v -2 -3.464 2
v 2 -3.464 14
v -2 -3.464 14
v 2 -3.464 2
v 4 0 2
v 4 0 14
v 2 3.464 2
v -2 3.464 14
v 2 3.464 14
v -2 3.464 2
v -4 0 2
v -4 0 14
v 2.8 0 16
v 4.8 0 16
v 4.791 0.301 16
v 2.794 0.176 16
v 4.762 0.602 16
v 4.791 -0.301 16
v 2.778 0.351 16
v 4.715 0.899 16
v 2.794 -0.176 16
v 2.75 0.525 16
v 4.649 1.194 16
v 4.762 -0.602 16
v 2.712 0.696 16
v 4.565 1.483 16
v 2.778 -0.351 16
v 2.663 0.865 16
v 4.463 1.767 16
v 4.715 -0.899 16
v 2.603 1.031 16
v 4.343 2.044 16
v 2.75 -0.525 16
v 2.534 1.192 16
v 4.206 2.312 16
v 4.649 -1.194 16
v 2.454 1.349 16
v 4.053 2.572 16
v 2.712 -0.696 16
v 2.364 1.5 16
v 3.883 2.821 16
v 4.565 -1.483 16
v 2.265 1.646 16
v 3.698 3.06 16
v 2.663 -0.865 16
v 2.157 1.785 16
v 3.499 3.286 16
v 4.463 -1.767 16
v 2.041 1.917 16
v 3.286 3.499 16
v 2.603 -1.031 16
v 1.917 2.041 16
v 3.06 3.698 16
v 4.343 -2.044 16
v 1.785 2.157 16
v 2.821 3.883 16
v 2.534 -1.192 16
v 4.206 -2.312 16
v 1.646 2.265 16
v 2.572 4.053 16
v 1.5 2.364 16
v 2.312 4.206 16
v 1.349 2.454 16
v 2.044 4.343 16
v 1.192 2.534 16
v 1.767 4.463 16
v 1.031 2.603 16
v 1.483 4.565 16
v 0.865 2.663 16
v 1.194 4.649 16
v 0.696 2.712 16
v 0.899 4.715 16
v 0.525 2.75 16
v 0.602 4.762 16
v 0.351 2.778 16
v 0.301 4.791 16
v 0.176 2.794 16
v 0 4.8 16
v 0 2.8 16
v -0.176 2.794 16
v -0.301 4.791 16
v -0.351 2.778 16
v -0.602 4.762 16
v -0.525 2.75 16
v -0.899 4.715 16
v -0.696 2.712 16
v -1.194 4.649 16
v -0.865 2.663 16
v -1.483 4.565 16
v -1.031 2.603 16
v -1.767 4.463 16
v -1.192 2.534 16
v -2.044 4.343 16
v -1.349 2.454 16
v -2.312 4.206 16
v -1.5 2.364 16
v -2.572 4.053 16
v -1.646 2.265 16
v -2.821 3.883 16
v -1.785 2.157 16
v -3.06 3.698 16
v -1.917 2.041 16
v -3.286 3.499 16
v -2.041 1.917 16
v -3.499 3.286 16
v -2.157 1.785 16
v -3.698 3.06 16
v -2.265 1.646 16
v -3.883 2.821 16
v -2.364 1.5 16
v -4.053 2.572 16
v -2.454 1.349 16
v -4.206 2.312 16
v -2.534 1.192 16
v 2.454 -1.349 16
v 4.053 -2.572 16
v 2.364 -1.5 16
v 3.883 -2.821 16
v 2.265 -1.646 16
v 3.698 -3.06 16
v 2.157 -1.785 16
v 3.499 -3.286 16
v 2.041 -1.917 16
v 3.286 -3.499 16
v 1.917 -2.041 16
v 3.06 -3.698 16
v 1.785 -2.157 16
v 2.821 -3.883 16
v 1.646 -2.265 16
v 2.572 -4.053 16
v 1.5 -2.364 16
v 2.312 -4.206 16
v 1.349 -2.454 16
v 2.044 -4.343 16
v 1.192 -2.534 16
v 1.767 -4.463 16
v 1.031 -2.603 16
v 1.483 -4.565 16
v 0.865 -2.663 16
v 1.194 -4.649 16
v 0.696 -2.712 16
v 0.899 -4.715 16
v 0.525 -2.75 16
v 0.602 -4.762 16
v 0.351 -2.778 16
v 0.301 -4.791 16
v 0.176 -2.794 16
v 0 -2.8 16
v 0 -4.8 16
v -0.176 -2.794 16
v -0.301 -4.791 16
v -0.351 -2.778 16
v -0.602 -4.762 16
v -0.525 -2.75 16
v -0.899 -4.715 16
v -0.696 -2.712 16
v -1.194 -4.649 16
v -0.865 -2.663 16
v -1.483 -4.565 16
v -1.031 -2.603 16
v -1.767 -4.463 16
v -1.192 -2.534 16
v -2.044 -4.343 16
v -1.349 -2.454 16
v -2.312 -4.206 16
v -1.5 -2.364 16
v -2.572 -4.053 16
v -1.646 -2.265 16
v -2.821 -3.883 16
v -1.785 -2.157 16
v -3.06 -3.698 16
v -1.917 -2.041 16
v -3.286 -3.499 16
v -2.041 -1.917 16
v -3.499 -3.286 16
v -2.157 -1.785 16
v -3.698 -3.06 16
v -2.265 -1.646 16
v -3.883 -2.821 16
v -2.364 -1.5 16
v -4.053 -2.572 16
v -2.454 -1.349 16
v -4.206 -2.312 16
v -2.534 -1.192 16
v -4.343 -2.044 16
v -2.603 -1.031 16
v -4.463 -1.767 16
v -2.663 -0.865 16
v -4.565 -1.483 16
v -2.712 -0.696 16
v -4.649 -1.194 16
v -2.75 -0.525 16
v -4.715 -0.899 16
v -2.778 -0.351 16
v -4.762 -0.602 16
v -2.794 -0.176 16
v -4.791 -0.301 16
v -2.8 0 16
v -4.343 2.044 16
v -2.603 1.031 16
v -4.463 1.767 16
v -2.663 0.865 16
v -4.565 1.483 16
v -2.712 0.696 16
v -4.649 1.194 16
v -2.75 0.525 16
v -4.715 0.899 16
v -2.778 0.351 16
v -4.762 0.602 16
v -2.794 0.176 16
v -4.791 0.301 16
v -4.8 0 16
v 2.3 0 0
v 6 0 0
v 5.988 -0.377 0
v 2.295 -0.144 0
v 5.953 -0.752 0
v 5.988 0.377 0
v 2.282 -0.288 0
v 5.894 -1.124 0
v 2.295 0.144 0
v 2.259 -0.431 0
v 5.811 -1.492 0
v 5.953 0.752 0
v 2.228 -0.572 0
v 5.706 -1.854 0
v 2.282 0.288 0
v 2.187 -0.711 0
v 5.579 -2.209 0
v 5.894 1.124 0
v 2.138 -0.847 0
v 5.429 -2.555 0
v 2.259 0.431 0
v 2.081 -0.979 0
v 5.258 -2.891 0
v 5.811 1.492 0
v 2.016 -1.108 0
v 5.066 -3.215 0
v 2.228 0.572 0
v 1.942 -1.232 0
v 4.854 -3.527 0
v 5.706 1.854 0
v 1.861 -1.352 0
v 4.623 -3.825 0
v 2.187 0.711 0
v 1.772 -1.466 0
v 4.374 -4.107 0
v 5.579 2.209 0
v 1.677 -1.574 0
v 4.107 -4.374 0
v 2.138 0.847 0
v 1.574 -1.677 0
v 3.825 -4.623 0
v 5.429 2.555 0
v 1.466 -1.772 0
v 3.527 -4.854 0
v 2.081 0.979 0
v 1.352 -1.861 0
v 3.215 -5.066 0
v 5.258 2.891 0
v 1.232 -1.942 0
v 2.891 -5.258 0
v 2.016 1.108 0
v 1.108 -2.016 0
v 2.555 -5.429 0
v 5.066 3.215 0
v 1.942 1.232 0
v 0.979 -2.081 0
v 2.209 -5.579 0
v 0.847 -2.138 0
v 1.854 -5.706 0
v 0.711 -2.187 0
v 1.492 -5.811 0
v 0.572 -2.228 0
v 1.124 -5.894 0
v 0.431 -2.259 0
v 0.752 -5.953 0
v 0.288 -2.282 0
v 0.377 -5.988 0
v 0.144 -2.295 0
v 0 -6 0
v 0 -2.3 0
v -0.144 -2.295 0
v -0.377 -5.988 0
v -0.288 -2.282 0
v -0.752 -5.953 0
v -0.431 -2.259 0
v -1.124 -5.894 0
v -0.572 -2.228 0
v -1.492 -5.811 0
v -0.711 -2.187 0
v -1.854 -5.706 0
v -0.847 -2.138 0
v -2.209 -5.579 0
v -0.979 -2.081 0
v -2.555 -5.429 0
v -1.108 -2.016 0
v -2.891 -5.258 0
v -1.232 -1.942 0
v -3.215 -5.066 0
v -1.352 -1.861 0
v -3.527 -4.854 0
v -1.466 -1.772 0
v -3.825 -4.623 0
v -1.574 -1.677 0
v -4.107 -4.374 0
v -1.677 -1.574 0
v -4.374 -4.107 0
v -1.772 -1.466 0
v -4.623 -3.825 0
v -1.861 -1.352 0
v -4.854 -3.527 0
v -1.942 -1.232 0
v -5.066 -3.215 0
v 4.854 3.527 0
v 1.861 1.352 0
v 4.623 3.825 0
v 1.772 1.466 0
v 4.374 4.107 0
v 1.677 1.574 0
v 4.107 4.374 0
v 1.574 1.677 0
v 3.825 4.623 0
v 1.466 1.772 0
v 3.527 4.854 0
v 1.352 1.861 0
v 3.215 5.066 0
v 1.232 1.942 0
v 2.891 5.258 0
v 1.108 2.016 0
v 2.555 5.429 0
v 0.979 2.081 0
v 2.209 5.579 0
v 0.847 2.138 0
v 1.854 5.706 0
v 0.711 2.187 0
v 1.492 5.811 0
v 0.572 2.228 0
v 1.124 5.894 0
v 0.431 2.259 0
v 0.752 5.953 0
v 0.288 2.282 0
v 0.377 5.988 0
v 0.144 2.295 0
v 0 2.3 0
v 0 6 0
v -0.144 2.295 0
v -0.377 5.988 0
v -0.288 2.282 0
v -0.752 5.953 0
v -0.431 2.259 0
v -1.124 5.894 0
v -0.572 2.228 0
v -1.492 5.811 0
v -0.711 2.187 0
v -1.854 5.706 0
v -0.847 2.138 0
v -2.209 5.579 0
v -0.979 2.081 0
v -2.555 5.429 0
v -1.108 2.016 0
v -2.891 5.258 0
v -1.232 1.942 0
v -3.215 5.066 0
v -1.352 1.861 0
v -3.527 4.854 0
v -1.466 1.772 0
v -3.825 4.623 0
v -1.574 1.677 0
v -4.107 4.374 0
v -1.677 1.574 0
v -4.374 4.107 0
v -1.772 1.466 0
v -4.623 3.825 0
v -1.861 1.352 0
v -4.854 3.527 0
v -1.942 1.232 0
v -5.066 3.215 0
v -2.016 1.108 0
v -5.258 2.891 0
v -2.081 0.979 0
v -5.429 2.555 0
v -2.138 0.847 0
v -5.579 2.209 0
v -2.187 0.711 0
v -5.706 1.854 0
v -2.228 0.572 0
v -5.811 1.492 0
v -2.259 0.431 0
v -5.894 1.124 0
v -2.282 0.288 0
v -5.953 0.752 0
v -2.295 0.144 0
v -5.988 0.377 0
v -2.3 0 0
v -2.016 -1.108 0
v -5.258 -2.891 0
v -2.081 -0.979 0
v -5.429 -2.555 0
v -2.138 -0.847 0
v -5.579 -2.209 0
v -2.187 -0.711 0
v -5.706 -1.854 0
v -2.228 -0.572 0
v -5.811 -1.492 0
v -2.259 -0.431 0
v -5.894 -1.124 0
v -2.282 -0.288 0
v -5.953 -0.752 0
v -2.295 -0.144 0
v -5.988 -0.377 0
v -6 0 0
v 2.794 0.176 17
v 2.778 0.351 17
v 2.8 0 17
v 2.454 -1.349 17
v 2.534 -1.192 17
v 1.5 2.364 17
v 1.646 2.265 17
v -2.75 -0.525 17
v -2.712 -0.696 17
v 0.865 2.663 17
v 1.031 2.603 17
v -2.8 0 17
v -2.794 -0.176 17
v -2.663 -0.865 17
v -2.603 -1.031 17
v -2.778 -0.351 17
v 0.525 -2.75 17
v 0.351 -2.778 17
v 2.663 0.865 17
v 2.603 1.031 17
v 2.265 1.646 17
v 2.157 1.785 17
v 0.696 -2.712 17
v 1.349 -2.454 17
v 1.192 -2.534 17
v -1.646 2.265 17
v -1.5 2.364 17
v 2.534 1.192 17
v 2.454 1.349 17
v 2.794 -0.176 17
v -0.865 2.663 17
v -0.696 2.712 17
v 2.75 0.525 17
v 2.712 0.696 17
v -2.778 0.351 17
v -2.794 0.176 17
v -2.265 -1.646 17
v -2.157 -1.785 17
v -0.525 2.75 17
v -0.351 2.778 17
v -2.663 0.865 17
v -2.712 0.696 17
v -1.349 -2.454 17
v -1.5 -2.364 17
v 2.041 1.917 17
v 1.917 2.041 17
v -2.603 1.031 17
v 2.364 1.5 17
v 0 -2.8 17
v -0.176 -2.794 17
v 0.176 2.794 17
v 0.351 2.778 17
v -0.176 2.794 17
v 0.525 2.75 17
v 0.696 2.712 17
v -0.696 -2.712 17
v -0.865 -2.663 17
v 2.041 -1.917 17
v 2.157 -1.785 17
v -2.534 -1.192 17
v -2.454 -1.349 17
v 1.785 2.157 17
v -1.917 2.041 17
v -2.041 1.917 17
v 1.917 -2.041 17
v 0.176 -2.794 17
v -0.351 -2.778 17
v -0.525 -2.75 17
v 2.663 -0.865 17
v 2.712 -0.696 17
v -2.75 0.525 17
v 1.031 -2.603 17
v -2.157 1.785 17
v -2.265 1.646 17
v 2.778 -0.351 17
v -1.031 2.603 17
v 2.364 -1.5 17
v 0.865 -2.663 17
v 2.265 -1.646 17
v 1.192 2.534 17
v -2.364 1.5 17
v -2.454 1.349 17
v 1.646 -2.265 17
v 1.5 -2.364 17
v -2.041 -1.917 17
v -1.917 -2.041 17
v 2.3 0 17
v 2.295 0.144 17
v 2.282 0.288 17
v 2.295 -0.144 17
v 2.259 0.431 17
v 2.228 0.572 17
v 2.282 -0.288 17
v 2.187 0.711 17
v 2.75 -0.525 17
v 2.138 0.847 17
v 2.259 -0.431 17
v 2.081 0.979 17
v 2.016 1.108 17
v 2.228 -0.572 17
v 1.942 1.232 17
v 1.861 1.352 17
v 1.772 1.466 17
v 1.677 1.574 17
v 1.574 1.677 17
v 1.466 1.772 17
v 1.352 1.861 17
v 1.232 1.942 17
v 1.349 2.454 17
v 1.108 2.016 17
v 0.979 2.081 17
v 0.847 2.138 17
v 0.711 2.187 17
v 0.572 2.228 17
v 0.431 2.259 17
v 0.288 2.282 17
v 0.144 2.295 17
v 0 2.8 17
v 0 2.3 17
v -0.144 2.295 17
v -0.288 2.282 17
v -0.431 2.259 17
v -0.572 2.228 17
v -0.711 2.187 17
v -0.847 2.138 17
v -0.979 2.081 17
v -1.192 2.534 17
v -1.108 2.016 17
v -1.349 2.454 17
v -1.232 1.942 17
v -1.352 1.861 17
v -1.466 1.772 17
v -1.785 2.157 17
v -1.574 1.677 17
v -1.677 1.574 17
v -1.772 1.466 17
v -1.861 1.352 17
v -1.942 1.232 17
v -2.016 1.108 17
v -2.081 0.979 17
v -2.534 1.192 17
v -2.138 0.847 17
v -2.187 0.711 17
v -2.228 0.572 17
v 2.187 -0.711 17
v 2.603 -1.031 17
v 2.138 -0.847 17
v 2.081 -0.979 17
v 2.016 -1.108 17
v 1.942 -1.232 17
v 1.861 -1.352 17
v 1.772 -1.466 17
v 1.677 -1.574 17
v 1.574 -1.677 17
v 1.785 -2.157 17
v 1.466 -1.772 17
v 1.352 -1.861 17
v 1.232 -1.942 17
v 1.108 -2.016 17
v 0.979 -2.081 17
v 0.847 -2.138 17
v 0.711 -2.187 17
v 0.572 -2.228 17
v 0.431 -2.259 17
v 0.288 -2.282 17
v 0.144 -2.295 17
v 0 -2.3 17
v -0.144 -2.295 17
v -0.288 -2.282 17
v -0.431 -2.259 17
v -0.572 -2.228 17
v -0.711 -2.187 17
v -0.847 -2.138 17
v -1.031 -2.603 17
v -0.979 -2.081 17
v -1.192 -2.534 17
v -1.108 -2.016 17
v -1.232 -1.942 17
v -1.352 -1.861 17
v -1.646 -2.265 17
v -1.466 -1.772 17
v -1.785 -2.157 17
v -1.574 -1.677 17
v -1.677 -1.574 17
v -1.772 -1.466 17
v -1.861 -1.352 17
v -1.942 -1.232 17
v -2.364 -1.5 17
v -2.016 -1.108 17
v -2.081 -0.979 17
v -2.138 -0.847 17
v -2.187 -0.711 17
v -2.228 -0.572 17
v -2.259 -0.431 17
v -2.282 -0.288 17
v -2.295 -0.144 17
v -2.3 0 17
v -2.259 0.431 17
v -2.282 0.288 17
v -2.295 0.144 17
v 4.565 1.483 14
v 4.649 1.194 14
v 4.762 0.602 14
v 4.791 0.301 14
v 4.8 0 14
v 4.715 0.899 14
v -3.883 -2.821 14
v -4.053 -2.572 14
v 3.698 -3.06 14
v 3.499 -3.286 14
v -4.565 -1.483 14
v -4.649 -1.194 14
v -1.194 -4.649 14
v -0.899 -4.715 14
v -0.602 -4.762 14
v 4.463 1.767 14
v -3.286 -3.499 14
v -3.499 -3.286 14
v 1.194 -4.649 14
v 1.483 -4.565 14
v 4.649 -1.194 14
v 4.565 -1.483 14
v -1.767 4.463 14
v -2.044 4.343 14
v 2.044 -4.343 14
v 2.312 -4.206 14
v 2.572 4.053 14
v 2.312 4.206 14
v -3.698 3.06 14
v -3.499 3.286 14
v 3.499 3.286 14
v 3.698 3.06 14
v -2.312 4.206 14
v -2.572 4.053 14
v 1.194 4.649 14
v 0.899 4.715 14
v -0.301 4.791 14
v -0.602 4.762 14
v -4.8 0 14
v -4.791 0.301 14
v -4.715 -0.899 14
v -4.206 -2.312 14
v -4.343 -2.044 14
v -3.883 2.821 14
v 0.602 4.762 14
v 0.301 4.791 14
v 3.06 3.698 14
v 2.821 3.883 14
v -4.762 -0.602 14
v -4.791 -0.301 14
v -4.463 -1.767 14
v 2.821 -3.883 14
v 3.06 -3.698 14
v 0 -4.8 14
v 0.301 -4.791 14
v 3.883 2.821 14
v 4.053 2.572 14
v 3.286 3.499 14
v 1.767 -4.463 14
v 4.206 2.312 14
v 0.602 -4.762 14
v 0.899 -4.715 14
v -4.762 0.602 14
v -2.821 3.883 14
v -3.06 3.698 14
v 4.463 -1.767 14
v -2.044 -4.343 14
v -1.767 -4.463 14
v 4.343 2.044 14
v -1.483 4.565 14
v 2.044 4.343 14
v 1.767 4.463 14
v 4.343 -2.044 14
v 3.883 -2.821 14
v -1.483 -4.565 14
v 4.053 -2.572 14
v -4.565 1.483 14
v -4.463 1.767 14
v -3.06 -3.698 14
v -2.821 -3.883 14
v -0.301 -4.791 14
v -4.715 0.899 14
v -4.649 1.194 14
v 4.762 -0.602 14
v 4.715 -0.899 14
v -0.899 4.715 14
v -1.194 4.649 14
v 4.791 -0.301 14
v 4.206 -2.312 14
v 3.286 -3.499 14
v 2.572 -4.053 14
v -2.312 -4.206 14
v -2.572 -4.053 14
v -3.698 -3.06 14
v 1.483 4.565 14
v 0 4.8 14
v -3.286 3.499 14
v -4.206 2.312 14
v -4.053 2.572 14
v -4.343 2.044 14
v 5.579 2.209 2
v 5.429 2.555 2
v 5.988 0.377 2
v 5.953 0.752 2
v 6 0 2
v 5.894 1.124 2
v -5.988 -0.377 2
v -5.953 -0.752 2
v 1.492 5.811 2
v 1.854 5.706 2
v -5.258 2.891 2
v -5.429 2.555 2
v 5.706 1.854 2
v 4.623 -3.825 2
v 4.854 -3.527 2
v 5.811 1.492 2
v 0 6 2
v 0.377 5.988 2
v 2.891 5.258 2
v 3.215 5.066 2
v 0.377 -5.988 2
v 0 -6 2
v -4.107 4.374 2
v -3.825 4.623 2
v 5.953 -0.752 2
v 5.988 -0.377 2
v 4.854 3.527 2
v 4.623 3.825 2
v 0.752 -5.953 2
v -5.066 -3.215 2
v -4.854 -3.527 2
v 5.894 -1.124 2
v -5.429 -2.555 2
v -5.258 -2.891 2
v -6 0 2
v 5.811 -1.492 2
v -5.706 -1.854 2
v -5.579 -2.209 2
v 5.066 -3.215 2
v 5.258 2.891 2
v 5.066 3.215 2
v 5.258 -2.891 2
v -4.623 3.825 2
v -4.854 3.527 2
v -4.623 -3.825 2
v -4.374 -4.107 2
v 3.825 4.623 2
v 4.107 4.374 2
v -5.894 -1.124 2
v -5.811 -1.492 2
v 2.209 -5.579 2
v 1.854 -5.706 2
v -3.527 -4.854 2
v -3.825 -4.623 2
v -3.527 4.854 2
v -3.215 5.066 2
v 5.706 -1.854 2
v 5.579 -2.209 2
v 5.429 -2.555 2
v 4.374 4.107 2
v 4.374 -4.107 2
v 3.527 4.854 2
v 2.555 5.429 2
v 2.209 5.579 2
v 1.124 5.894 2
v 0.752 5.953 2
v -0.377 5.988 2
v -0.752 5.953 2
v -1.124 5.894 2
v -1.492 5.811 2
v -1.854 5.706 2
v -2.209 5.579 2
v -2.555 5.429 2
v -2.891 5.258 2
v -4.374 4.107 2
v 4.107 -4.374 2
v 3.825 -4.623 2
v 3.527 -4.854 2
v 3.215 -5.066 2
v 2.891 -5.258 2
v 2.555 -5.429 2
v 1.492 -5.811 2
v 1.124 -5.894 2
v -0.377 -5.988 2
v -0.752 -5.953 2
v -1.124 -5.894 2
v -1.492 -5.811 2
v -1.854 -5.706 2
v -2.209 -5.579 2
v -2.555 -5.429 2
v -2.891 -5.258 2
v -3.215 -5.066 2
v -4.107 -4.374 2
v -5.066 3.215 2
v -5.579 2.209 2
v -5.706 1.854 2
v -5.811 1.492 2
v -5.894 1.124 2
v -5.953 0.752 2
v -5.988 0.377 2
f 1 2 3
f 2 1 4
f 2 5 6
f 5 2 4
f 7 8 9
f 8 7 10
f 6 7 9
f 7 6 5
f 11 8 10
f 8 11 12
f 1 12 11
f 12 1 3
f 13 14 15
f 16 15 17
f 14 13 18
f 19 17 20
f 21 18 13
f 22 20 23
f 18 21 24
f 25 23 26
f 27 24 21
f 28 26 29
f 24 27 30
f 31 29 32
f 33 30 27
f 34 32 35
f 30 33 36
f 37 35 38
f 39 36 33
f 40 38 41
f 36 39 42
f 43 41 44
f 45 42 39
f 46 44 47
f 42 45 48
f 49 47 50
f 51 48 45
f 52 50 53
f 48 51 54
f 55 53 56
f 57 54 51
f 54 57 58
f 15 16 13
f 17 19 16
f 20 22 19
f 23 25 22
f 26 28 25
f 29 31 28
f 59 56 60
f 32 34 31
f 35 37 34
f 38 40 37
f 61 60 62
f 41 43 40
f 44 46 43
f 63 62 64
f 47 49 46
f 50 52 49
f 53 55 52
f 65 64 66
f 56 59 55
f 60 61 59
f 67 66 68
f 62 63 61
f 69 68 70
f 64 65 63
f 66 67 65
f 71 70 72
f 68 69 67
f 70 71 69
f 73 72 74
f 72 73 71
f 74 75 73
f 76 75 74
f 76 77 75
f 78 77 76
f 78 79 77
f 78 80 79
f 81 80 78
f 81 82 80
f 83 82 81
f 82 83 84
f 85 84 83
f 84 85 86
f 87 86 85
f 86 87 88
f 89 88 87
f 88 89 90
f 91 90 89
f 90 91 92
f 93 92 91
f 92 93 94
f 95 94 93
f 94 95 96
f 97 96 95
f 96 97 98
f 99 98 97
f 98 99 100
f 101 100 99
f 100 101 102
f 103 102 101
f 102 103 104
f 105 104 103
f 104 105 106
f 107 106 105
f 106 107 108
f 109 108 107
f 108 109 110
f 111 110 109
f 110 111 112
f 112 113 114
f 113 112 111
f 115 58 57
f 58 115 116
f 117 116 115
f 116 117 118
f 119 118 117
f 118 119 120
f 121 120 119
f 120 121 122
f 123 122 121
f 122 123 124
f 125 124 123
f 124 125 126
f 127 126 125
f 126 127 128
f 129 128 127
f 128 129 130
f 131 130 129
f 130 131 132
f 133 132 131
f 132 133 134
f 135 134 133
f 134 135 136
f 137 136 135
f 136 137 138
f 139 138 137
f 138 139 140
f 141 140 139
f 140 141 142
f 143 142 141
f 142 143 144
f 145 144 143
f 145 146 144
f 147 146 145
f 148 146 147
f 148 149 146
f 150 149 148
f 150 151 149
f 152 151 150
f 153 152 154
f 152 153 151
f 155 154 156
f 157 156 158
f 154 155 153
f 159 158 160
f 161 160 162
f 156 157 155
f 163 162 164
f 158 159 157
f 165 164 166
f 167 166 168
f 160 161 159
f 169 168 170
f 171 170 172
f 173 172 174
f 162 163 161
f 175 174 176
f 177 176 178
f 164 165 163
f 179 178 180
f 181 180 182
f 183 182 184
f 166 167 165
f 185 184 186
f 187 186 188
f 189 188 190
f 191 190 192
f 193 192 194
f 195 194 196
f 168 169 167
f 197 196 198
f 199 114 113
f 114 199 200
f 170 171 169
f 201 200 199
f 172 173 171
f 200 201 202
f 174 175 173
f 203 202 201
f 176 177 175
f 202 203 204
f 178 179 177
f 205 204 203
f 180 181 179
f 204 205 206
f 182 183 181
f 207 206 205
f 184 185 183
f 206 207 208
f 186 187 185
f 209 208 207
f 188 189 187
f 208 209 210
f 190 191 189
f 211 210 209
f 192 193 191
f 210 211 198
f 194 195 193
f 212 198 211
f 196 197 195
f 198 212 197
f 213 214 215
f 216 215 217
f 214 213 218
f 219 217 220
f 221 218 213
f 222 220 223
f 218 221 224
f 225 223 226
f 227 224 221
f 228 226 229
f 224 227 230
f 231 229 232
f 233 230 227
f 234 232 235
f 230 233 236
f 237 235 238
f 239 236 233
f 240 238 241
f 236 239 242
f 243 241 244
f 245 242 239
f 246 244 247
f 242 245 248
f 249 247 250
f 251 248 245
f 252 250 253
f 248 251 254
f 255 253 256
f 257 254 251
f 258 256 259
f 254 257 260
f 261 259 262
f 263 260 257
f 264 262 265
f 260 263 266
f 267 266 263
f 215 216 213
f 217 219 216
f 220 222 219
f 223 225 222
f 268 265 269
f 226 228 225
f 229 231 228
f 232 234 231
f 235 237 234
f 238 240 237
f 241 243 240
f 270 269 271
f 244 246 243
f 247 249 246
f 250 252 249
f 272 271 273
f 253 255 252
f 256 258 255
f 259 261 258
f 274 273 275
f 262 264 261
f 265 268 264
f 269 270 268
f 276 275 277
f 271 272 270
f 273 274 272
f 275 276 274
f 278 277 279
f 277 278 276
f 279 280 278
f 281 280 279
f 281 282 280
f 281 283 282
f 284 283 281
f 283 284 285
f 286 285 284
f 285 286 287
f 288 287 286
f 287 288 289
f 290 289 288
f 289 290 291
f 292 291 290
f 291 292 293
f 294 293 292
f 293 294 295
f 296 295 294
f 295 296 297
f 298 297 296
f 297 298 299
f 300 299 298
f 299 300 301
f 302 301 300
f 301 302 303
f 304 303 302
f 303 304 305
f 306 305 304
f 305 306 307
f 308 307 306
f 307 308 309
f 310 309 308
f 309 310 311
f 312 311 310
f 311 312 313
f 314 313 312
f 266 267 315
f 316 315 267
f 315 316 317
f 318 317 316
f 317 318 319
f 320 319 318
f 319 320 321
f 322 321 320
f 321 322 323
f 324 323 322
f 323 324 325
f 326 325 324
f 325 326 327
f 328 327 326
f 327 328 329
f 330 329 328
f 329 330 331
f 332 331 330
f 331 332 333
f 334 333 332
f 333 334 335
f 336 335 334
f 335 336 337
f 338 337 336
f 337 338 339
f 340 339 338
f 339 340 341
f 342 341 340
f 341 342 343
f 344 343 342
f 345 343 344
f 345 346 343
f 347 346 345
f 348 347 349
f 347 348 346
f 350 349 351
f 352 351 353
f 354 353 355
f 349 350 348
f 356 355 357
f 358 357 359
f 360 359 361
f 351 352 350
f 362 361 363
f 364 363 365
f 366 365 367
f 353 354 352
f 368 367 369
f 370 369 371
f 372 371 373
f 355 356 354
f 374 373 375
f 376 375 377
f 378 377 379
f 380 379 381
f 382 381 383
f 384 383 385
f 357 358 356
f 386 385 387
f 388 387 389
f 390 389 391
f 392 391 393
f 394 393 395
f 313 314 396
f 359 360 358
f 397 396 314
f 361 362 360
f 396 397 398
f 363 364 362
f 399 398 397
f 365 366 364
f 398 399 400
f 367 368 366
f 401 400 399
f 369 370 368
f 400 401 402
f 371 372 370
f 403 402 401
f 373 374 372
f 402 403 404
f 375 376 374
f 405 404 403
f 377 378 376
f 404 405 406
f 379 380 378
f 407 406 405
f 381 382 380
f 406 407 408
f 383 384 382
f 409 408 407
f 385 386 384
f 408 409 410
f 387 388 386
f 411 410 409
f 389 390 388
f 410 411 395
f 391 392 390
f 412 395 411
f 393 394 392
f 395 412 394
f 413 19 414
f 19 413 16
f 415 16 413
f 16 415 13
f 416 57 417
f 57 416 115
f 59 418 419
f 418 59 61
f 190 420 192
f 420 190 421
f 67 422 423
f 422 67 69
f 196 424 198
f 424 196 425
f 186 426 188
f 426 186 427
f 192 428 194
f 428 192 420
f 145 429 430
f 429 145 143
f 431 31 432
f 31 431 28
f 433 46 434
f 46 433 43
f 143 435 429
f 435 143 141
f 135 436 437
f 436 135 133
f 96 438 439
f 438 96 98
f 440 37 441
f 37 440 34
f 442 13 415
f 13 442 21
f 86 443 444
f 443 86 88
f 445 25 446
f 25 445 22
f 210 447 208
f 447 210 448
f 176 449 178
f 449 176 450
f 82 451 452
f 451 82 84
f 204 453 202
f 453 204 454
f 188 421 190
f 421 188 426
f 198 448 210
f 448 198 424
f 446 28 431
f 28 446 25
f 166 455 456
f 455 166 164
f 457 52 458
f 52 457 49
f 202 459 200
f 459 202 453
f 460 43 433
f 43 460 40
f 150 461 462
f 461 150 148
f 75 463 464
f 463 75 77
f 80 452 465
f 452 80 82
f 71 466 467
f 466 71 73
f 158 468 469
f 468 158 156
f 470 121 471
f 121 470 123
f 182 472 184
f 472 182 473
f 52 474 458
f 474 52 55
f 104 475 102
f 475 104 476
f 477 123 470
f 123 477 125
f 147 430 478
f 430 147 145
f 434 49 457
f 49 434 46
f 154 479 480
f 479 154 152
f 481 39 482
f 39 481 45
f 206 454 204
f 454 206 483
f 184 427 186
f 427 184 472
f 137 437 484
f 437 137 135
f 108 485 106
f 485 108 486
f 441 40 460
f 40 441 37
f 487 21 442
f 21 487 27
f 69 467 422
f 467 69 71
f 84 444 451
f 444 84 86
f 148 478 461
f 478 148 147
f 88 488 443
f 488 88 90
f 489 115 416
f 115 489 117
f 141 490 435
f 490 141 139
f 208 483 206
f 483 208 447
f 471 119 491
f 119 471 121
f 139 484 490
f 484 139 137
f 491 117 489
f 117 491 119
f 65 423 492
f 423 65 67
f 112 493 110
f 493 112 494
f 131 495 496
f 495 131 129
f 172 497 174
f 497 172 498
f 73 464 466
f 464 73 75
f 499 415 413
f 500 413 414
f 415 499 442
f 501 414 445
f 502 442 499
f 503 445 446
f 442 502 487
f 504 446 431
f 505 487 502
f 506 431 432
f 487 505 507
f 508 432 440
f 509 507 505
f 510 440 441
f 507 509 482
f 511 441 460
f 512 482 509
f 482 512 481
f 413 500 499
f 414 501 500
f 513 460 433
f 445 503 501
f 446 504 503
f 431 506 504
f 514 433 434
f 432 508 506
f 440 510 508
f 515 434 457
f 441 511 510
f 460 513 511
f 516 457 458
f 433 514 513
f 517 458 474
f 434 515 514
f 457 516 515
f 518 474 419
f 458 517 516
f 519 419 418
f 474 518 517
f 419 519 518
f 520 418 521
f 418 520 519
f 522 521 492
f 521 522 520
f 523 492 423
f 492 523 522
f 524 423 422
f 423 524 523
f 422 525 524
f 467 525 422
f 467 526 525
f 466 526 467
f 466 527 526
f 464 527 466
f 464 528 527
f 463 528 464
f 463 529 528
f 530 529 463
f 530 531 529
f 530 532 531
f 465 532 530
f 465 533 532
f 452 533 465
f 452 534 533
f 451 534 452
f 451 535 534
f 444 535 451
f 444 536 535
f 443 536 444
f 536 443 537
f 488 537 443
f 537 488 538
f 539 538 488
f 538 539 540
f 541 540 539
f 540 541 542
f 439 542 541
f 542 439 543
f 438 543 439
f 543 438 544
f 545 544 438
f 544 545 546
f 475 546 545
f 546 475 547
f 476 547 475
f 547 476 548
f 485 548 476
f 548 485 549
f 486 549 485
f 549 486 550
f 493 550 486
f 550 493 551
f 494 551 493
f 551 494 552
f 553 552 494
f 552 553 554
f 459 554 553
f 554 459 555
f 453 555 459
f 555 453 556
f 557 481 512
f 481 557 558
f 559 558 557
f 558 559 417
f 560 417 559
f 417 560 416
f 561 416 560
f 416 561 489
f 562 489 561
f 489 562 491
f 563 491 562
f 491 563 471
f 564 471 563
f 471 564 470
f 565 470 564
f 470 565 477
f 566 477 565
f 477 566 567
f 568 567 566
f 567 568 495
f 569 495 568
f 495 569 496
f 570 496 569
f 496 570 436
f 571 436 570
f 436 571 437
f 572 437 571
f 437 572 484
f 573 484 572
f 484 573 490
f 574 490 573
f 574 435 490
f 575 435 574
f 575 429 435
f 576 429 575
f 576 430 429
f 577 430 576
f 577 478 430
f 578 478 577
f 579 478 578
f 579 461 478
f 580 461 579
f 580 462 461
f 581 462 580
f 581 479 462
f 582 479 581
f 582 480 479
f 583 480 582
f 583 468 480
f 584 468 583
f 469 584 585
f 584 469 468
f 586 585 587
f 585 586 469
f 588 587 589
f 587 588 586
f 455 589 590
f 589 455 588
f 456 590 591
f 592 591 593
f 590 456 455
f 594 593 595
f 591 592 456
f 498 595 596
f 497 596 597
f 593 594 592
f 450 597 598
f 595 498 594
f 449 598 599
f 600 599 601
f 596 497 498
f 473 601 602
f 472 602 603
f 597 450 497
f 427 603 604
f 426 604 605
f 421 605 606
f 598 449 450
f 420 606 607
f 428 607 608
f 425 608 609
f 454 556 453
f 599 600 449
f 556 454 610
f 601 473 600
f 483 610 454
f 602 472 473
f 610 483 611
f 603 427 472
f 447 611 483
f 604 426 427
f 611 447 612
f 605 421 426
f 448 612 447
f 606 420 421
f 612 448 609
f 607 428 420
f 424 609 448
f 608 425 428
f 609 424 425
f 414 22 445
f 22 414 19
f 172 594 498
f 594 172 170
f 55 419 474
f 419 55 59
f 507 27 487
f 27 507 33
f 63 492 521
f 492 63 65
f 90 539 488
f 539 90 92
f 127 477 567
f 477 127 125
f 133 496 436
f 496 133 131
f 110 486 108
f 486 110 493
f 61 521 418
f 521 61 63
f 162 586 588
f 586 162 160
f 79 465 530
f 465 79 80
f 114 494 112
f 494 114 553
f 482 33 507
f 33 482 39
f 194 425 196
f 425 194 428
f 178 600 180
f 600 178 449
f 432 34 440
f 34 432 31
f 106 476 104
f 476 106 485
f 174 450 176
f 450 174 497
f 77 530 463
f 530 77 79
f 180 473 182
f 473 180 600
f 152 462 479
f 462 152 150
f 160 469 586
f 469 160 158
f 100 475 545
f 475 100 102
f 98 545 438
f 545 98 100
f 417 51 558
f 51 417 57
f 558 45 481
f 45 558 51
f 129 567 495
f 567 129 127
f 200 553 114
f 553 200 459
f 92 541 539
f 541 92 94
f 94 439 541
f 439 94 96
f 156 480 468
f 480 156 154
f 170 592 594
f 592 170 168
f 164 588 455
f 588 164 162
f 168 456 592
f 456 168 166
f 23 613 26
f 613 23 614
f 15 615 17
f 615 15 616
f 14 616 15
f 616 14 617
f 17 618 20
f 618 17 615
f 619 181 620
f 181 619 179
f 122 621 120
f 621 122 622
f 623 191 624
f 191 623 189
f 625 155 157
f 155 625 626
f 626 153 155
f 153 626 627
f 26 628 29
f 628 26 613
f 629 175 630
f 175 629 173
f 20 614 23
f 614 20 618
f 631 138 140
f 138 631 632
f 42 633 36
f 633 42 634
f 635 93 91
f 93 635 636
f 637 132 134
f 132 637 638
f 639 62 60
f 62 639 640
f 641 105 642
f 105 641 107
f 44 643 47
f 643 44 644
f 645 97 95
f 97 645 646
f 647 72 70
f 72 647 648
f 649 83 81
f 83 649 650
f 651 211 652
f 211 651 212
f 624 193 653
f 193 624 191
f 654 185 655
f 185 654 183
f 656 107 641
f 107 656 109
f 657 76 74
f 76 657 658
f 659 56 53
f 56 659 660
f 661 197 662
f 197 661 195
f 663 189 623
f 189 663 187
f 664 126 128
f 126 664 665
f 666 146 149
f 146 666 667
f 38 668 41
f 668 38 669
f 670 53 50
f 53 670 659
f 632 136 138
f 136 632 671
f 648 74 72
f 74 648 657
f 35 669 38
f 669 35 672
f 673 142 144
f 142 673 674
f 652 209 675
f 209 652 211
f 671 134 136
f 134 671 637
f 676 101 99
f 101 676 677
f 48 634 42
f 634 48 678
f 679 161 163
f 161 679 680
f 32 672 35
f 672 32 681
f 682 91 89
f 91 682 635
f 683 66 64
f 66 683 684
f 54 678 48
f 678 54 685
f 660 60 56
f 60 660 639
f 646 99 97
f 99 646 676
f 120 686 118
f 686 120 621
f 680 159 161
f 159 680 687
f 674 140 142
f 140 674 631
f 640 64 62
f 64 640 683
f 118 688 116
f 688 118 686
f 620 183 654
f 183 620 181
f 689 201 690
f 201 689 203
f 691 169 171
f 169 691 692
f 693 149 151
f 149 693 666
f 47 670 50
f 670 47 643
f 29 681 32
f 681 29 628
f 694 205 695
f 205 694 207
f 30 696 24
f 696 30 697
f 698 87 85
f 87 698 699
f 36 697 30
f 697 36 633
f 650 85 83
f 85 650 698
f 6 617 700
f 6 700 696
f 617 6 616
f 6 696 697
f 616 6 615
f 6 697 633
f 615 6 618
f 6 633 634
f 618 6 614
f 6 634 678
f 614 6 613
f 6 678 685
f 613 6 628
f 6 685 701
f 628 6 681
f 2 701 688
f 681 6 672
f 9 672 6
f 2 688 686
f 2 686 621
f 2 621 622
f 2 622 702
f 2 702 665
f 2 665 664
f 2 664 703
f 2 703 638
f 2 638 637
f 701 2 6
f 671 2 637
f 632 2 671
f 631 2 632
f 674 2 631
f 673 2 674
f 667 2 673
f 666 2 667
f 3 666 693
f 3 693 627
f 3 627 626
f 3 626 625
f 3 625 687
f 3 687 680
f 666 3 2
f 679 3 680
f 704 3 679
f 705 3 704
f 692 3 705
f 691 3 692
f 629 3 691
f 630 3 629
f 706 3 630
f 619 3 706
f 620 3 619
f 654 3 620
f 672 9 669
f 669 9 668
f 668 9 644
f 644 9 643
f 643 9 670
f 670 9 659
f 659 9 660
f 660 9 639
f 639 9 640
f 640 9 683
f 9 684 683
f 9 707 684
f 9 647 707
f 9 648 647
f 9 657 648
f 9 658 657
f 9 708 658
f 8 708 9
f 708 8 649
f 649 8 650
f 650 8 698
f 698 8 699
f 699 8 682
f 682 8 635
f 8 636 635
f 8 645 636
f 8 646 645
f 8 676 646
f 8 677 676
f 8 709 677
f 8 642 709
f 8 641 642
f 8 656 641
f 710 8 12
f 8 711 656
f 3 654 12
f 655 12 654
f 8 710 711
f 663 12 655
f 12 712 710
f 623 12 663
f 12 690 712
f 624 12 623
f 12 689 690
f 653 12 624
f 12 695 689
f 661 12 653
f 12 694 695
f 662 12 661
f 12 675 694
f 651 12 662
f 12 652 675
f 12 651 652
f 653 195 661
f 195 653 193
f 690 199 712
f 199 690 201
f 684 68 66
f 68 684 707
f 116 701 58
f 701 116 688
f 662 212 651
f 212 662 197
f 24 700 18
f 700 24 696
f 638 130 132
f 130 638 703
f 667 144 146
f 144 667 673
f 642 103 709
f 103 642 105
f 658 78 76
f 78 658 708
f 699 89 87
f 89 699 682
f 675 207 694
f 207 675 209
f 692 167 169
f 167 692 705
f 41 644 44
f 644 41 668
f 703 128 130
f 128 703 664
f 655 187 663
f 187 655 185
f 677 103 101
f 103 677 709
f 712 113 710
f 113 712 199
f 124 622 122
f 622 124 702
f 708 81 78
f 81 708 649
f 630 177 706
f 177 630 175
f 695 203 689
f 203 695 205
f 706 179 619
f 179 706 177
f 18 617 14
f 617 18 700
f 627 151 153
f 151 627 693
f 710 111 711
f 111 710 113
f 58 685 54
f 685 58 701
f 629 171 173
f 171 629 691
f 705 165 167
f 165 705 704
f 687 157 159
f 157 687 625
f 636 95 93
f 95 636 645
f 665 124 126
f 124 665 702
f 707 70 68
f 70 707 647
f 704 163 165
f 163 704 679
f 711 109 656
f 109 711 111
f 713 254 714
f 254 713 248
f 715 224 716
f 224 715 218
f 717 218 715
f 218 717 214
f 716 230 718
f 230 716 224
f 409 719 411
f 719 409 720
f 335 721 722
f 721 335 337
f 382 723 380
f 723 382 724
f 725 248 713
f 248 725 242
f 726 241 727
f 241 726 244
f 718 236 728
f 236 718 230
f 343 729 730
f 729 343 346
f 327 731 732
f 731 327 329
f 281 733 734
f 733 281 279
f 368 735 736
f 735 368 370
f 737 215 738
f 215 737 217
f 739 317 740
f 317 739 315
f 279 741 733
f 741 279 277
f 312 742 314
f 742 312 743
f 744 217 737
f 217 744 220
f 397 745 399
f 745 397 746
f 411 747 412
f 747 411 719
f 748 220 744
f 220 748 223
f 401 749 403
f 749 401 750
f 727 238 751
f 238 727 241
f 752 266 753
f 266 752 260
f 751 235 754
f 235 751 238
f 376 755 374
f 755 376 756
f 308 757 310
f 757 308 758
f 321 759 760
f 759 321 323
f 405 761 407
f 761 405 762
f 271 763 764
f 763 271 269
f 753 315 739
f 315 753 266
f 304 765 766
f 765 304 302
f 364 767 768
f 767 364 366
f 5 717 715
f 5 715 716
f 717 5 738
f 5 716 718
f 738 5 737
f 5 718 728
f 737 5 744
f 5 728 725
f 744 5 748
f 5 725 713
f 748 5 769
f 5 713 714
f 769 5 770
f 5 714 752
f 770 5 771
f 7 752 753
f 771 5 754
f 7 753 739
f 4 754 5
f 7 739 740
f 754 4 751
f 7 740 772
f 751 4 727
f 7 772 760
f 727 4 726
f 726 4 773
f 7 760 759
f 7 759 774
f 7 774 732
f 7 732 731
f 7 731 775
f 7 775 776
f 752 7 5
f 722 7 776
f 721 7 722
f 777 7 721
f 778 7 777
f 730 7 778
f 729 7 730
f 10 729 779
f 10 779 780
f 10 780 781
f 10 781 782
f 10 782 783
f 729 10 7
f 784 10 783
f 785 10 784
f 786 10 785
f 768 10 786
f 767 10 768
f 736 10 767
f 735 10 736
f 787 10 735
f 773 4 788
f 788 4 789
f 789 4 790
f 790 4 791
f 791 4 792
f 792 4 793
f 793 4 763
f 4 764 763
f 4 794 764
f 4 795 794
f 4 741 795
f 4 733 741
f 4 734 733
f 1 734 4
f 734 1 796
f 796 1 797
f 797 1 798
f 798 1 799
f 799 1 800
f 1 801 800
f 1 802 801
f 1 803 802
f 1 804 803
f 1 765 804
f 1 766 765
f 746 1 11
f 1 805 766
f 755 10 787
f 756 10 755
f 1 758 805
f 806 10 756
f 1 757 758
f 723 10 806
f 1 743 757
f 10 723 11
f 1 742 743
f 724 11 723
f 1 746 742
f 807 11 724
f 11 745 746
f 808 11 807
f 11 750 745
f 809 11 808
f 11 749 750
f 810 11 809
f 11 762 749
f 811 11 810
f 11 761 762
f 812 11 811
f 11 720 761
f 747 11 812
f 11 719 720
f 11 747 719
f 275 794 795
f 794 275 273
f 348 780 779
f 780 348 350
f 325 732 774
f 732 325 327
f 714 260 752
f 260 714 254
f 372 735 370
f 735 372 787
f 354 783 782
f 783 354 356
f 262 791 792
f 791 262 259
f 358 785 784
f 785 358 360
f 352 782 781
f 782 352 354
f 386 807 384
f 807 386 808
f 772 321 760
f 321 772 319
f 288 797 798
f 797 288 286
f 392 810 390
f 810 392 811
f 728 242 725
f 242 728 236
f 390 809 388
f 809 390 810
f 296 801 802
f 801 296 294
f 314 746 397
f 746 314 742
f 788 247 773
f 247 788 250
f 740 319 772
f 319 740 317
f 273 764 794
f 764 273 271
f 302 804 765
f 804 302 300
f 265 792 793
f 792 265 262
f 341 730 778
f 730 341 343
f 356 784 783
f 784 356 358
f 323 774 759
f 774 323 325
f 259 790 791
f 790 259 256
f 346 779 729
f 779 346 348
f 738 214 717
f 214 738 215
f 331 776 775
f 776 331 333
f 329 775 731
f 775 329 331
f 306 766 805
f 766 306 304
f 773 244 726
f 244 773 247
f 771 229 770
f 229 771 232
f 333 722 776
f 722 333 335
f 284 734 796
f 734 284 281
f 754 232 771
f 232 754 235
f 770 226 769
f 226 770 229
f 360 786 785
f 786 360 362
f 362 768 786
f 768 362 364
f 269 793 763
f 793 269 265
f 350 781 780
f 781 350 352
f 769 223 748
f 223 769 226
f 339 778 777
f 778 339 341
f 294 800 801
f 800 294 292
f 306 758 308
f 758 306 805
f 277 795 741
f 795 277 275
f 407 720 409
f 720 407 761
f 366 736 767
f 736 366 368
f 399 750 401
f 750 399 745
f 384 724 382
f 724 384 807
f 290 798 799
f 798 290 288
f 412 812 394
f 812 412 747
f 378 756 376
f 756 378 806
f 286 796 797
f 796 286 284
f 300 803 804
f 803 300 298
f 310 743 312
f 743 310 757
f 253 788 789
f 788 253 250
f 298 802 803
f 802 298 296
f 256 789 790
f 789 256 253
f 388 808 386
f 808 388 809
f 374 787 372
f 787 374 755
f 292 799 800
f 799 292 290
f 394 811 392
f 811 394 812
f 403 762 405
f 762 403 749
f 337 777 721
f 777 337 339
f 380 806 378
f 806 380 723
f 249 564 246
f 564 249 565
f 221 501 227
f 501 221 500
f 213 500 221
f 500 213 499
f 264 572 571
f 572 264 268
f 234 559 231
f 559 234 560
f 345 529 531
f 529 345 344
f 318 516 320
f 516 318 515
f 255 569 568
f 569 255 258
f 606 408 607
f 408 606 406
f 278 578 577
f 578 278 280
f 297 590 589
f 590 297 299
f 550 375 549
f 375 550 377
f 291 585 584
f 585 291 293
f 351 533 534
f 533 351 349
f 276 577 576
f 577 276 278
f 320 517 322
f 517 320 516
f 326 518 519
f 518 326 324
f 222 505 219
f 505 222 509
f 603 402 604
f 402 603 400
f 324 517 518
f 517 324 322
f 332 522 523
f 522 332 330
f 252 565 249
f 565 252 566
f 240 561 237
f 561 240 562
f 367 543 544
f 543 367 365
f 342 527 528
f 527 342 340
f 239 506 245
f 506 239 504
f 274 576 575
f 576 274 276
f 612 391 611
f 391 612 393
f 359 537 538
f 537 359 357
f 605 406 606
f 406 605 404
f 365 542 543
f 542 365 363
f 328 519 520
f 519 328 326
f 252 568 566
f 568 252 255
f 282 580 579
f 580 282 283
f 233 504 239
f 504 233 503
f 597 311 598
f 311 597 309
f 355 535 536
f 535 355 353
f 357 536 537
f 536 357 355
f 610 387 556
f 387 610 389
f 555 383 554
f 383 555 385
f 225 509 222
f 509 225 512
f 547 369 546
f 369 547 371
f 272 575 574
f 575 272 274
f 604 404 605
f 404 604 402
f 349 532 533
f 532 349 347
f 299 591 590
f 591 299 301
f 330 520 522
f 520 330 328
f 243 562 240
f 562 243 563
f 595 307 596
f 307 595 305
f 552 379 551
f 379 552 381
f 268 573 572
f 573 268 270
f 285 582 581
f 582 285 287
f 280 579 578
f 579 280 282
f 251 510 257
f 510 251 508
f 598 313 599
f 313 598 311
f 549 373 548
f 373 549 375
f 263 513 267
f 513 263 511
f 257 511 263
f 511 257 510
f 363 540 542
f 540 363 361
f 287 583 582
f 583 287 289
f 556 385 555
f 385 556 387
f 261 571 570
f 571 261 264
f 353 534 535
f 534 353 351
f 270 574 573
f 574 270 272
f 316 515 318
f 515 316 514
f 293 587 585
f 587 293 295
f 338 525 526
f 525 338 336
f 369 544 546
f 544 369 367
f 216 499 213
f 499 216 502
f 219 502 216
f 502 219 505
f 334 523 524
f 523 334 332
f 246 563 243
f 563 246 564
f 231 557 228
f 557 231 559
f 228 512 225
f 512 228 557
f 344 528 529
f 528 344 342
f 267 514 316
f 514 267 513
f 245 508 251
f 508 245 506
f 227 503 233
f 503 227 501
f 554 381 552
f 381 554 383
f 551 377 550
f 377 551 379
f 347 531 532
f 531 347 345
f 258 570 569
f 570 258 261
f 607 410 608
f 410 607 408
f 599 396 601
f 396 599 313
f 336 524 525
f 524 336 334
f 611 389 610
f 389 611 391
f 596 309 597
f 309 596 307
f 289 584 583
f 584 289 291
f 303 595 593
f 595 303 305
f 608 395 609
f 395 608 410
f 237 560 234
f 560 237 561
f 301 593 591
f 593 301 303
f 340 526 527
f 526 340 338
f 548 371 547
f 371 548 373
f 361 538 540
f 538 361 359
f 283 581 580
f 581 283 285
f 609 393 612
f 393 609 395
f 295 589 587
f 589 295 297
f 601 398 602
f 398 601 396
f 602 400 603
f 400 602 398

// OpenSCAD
/*
  Entretoises de fixation mouvements (ancien lecteur de CD/DVD)
  Projets DIY - 02/20016 - http://www.projetsdiy.fr
  v1
*/

$fn = 100;
hauteur = 16;       //Hauteur de l'entretoise
   

module entretoise(diam_centreur){
  difference(){
    union(){
      cylinder(r=4,h=hauteur,$fn=6);   //Corps entretoise
      translate([0,0,hauteur]) cylinder(r=diam_centreur / 2,h=2,center=true); //Centreur
      translate([0,0,hauteur - 2]) cylinder(r= diam_centreur / 2 + 2, h=2);   //Colerette
      cylinder(r=6,h=2); 
    }
    cylinder(r=2.3, h=30);                      //Passage de vis
  }
}

for (a=[0:0]){
    translate([a, 0,0]) entretoise(5.6);        //4 entretoises avec petit centreur
    //translate([a, 0,0]) entretoise(7.3);       //4 entretoises avec gros centreur
}
